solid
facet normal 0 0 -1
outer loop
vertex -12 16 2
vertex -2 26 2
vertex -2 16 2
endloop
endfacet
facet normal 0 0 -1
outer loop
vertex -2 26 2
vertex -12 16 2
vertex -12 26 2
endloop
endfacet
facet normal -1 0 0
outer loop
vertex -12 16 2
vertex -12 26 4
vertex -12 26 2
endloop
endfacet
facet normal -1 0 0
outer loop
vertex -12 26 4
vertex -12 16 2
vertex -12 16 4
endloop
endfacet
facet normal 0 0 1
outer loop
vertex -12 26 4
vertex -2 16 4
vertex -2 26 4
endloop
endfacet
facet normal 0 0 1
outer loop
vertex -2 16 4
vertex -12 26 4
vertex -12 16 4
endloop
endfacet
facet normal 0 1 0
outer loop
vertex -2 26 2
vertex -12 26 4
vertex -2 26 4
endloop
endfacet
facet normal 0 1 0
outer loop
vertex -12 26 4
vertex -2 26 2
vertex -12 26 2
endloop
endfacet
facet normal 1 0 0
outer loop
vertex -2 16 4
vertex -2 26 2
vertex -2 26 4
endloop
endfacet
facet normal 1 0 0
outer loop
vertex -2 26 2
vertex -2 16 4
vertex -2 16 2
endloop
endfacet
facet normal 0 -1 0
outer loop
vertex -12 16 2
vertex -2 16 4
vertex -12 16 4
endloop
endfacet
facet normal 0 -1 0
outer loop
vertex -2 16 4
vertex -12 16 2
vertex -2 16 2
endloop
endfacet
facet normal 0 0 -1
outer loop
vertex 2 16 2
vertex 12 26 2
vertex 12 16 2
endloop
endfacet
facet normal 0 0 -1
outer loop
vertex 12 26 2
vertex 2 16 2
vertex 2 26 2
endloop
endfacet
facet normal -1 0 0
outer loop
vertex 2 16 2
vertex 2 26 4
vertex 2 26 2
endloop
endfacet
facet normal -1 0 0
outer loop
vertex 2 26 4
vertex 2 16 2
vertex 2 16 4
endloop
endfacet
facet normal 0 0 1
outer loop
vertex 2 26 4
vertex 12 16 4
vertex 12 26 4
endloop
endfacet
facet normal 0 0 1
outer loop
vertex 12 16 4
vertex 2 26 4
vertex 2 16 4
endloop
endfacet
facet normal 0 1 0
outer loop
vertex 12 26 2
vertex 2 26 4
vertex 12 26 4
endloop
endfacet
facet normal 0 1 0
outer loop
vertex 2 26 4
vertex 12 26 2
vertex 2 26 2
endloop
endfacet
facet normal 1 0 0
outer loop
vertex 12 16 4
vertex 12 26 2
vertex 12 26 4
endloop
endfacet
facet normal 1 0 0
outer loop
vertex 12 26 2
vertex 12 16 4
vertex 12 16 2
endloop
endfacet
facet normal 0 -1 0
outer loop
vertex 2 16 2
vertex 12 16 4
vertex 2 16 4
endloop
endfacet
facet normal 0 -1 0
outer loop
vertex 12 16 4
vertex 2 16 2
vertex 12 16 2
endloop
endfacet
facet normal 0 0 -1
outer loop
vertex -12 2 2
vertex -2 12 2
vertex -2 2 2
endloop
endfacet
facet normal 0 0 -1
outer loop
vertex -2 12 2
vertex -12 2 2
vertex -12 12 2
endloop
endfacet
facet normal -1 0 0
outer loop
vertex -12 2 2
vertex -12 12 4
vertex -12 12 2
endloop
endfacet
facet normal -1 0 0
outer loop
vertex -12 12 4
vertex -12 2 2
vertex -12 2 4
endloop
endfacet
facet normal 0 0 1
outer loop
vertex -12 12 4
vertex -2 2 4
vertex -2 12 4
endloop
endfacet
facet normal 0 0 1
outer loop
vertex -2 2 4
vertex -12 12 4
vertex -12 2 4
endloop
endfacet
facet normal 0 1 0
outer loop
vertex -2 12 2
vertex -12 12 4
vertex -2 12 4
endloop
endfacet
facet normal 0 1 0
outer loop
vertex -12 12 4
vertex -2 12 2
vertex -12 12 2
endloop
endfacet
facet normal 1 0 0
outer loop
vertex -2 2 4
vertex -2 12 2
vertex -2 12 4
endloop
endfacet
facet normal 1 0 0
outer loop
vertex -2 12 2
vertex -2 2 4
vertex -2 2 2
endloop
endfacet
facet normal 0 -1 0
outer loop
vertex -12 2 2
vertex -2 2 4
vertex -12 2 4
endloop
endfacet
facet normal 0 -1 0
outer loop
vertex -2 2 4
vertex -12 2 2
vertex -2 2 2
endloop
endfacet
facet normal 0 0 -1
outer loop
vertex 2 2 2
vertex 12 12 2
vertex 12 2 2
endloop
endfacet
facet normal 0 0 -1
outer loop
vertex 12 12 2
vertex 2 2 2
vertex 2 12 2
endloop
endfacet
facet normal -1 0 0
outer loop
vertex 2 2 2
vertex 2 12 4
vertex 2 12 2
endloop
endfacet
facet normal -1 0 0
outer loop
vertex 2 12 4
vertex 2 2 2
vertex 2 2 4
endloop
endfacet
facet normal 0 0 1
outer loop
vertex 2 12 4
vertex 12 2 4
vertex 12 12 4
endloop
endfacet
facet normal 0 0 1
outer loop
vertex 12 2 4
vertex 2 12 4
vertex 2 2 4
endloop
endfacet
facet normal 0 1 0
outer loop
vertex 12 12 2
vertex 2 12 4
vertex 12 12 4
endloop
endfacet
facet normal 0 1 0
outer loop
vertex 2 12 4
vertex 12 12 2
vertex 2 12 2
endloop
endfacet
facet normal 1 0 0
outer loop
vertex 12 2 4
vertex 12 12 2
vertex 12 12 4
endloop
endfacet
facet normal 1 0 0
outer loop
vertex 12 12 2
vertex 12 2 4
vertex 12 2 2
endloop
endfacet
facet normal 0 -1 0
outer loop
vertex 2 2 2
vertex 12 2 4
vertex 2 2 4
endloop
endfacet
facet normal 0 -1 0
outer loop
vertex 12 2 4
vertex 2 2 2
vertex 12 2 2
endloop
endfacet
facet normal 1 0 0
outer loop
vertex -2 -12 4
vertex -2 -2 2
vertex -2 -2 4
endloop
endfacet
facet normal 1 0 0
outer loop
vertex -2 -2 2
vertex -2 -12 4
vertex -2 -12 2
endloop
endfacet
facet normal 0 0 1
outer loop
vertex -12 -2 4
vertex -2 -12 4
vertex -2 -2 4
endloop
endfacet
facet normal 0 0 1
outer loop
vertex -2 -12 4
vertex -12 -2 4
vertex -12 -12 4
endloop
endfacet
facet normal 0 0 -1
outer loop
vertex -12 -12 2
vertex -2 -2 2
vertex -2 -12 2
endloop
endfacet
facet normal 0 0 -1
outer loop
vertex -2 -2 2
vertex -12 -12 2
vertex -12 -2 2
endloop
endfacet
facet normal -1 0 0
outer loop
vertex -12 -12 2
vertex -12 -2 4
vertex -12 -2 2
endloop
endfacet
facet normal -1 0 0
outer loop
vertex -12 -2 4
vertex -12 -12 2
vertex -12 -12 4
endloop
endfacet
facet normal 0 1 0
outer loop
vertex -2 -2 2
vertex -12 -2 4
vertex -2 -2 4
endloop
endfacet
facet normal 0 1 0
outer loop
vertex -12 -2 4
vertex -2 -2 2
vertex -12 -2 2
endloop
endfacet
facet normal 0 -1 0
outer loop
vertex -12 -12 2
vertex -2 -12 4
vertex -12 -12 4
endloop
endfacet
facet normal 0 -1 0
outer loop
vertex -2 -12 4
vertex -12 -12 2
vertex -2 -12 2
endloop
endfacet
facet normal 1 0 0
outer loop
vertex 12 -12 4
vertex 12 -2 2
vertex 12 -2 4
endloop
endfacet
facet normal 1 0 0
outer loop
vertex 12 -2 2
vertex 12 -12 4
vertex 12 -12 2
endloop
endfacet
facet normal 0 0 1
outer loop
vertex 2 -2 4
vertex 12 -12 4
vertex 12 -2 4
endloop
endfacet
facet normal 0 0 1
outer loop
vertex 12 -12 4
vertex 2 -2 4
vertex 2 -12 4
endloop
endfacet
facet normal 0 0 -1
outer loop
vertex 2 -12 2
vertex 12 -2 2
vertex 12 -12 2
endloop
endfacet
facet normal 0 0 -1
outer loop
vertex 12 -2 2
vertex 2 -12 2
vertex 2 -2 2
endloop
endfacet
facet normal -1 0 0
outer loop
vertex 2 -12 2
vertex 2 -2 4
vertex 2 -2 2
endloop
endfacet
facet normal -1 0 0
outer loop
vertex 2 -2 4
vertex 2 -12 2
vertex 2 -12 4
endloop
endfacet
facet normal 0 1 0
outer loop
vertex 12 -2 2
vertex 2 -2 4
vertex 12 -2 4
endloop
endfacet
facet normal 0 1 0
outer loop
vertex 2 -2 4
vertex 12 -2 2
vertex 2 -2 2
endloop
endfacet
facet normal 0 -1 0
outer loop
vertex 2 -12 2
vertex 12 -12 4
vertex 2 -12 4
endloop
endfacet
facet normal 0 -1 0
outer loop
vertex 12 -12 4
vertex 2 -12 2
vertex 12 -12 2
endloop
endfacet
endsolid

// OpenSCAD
union(){
  translate([-7,21,2])
    color("green")
      linear_extrude(2)
        square(10,true);
        
  translate([7,21,2]) 
  color("red") 
    linear_extrude(2) 
      square(10,true);
}

translate([0,7,2]){
  translate([-7,0,0])
    color("green")
      linear_extrude(2)
        square(10,true);
        
  translate([7,0,0]) 
  color("red") 
    linear_extrude(2) 
      square(10,true);
}

translate([0,-7,3]){
  translate([-7,0,0])
    color("green")
      cube([10,10,2],true);
        
  translate([7,0,0]) 
  color("red") 
    cube([10,10,2],true);
}
